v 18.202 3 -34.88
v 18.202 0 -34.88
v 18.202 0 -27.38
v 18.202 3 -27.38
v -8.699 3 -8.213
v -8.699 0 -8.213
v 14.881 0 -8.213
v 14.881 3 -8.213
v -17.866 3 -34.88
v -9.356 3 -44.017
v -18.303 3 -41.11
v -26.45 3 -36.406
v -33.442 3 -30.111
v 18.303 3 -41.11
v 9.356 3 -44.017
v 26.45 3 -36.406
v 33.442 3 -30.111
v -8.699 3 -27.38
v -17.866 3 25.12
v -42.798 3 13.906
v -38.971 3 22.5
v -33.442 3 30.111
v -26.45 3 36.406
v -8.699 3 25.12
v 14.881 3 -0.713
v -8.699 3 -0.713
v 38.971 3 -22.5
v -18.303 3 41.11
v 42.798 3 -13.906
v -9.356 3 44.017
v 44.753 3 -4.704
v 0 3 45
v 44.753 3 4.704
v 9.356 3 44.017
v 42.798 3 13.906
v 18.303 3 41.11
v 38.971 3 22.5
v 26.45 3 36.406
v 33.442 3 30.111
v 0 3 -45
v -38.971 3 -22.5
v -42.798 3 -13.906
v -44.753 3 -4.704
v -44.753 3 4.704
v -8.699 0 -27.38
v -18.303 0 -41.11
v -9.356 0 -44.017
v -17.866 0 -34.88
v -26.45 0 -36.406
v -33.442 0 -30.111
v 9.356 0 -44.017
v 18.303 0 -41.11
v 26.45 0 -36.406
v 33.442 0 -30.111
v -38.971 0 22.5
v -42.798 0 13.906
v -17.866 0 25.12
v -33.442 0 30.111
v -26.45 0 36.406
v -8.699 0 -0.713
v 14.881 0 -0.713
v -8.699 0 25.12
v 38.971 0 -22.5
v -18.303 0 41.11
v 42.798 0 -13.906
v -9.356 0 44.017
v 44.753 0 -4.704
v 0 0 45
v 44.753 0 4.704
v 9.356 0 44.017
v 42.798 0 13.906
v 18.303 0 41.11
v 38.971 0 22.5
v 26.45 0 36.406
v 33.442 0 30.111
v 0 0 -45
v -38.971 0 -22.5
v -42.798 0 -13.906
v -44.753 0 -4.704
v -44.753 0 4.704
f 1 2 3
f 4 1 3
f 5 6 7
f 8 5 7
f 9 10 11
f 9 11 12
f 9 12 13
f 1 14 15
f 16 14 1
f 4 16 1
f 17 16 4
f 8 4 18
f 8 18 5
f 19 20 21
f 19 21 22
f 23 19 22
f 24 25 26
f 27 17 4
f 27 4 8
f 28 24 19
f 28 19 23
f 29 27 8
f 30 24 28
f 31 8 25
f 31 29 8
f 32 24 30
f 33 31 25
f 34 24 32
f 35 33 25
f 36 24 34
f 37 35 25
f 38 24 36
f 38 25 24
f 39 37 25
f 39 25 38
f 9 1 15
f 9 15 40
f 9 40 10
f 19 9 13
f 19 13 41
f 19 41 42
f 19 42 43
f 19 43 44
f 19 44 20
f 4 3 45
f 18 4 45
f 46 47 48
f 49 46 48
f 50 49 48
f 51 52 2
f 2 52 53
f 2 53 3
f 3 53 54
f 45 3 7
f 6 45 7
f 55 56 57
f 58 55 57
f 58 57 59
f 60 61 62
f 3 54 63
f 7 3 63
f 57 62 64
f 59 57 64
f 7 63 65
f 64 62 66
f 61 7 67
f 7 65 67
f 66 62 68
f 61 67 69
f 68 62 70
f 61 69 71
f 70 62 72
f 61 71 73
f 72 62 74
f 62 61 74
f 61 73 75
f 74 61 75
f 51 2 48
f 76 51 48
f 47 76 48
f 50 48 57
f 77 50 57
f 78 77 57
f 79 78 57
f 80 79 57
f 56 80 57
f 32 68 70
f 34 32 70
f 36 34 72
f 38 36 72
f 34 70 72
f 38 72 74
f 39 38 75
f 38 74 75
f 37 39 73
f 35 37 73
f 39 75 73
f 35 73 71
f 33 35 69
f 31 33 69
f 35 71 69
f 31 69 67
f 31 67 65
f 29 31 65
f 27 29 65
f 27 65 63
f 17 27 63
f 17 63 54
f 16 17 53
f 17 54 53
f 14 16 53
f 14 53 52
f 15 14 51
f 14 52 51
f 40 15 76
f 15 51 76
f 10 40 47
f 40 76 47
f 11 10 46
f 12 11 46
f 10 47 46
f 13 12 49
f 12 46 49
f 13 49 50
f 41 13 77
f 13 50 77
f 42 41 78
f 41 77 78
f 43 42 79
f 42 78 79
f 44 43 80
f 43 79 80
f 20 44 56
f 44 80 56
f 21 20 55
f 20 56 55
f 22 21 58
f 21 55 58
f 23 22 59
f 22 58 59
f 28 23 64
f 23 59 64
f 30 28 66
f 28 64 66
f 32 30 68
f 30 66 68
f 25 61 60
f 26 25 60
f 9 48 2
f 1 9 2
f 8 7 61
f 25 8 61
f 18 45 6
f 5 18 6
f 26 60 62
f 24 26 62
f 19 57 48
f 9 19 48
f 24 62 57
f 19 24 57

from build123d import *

# Parameters (mm, degrees)
SKETCH1_R           = 45
BOSS_EXTRUDE1_DEPTH = 3


with BuildPart() as part:
    # Sketch1 → Boss-Extrude1 (new body)
    with BuildSketch(Plane(origin=(0, 0, 0), x_dir=(1, 0, 0), z_dir=(0, 1, 0))):
        with Locations(Location((0, 0, 0), (0, 0, 270))):  # turned: the seam where the file's is
            Circle(SKETCH1_R)
        Polygon((18.201594334, 34.879867703), (18.201594334, 27.379867703), (-8.699447333, 27.379867703), (-8.699447333, 8.213201037), (14.881281834, 8.213201037), (14.881281834, 0.713201037), (-8.699447333, 0.713201037), (-8.699447333, -25.120132297), (-17.866113999, -25.120132297), (-17.866113999, 34.879867703), align=None, mode=Mode.SUBTRACT)
    extrude(amount=BOSS_EXTRUDE1_DEPTH)


solid = part.part
